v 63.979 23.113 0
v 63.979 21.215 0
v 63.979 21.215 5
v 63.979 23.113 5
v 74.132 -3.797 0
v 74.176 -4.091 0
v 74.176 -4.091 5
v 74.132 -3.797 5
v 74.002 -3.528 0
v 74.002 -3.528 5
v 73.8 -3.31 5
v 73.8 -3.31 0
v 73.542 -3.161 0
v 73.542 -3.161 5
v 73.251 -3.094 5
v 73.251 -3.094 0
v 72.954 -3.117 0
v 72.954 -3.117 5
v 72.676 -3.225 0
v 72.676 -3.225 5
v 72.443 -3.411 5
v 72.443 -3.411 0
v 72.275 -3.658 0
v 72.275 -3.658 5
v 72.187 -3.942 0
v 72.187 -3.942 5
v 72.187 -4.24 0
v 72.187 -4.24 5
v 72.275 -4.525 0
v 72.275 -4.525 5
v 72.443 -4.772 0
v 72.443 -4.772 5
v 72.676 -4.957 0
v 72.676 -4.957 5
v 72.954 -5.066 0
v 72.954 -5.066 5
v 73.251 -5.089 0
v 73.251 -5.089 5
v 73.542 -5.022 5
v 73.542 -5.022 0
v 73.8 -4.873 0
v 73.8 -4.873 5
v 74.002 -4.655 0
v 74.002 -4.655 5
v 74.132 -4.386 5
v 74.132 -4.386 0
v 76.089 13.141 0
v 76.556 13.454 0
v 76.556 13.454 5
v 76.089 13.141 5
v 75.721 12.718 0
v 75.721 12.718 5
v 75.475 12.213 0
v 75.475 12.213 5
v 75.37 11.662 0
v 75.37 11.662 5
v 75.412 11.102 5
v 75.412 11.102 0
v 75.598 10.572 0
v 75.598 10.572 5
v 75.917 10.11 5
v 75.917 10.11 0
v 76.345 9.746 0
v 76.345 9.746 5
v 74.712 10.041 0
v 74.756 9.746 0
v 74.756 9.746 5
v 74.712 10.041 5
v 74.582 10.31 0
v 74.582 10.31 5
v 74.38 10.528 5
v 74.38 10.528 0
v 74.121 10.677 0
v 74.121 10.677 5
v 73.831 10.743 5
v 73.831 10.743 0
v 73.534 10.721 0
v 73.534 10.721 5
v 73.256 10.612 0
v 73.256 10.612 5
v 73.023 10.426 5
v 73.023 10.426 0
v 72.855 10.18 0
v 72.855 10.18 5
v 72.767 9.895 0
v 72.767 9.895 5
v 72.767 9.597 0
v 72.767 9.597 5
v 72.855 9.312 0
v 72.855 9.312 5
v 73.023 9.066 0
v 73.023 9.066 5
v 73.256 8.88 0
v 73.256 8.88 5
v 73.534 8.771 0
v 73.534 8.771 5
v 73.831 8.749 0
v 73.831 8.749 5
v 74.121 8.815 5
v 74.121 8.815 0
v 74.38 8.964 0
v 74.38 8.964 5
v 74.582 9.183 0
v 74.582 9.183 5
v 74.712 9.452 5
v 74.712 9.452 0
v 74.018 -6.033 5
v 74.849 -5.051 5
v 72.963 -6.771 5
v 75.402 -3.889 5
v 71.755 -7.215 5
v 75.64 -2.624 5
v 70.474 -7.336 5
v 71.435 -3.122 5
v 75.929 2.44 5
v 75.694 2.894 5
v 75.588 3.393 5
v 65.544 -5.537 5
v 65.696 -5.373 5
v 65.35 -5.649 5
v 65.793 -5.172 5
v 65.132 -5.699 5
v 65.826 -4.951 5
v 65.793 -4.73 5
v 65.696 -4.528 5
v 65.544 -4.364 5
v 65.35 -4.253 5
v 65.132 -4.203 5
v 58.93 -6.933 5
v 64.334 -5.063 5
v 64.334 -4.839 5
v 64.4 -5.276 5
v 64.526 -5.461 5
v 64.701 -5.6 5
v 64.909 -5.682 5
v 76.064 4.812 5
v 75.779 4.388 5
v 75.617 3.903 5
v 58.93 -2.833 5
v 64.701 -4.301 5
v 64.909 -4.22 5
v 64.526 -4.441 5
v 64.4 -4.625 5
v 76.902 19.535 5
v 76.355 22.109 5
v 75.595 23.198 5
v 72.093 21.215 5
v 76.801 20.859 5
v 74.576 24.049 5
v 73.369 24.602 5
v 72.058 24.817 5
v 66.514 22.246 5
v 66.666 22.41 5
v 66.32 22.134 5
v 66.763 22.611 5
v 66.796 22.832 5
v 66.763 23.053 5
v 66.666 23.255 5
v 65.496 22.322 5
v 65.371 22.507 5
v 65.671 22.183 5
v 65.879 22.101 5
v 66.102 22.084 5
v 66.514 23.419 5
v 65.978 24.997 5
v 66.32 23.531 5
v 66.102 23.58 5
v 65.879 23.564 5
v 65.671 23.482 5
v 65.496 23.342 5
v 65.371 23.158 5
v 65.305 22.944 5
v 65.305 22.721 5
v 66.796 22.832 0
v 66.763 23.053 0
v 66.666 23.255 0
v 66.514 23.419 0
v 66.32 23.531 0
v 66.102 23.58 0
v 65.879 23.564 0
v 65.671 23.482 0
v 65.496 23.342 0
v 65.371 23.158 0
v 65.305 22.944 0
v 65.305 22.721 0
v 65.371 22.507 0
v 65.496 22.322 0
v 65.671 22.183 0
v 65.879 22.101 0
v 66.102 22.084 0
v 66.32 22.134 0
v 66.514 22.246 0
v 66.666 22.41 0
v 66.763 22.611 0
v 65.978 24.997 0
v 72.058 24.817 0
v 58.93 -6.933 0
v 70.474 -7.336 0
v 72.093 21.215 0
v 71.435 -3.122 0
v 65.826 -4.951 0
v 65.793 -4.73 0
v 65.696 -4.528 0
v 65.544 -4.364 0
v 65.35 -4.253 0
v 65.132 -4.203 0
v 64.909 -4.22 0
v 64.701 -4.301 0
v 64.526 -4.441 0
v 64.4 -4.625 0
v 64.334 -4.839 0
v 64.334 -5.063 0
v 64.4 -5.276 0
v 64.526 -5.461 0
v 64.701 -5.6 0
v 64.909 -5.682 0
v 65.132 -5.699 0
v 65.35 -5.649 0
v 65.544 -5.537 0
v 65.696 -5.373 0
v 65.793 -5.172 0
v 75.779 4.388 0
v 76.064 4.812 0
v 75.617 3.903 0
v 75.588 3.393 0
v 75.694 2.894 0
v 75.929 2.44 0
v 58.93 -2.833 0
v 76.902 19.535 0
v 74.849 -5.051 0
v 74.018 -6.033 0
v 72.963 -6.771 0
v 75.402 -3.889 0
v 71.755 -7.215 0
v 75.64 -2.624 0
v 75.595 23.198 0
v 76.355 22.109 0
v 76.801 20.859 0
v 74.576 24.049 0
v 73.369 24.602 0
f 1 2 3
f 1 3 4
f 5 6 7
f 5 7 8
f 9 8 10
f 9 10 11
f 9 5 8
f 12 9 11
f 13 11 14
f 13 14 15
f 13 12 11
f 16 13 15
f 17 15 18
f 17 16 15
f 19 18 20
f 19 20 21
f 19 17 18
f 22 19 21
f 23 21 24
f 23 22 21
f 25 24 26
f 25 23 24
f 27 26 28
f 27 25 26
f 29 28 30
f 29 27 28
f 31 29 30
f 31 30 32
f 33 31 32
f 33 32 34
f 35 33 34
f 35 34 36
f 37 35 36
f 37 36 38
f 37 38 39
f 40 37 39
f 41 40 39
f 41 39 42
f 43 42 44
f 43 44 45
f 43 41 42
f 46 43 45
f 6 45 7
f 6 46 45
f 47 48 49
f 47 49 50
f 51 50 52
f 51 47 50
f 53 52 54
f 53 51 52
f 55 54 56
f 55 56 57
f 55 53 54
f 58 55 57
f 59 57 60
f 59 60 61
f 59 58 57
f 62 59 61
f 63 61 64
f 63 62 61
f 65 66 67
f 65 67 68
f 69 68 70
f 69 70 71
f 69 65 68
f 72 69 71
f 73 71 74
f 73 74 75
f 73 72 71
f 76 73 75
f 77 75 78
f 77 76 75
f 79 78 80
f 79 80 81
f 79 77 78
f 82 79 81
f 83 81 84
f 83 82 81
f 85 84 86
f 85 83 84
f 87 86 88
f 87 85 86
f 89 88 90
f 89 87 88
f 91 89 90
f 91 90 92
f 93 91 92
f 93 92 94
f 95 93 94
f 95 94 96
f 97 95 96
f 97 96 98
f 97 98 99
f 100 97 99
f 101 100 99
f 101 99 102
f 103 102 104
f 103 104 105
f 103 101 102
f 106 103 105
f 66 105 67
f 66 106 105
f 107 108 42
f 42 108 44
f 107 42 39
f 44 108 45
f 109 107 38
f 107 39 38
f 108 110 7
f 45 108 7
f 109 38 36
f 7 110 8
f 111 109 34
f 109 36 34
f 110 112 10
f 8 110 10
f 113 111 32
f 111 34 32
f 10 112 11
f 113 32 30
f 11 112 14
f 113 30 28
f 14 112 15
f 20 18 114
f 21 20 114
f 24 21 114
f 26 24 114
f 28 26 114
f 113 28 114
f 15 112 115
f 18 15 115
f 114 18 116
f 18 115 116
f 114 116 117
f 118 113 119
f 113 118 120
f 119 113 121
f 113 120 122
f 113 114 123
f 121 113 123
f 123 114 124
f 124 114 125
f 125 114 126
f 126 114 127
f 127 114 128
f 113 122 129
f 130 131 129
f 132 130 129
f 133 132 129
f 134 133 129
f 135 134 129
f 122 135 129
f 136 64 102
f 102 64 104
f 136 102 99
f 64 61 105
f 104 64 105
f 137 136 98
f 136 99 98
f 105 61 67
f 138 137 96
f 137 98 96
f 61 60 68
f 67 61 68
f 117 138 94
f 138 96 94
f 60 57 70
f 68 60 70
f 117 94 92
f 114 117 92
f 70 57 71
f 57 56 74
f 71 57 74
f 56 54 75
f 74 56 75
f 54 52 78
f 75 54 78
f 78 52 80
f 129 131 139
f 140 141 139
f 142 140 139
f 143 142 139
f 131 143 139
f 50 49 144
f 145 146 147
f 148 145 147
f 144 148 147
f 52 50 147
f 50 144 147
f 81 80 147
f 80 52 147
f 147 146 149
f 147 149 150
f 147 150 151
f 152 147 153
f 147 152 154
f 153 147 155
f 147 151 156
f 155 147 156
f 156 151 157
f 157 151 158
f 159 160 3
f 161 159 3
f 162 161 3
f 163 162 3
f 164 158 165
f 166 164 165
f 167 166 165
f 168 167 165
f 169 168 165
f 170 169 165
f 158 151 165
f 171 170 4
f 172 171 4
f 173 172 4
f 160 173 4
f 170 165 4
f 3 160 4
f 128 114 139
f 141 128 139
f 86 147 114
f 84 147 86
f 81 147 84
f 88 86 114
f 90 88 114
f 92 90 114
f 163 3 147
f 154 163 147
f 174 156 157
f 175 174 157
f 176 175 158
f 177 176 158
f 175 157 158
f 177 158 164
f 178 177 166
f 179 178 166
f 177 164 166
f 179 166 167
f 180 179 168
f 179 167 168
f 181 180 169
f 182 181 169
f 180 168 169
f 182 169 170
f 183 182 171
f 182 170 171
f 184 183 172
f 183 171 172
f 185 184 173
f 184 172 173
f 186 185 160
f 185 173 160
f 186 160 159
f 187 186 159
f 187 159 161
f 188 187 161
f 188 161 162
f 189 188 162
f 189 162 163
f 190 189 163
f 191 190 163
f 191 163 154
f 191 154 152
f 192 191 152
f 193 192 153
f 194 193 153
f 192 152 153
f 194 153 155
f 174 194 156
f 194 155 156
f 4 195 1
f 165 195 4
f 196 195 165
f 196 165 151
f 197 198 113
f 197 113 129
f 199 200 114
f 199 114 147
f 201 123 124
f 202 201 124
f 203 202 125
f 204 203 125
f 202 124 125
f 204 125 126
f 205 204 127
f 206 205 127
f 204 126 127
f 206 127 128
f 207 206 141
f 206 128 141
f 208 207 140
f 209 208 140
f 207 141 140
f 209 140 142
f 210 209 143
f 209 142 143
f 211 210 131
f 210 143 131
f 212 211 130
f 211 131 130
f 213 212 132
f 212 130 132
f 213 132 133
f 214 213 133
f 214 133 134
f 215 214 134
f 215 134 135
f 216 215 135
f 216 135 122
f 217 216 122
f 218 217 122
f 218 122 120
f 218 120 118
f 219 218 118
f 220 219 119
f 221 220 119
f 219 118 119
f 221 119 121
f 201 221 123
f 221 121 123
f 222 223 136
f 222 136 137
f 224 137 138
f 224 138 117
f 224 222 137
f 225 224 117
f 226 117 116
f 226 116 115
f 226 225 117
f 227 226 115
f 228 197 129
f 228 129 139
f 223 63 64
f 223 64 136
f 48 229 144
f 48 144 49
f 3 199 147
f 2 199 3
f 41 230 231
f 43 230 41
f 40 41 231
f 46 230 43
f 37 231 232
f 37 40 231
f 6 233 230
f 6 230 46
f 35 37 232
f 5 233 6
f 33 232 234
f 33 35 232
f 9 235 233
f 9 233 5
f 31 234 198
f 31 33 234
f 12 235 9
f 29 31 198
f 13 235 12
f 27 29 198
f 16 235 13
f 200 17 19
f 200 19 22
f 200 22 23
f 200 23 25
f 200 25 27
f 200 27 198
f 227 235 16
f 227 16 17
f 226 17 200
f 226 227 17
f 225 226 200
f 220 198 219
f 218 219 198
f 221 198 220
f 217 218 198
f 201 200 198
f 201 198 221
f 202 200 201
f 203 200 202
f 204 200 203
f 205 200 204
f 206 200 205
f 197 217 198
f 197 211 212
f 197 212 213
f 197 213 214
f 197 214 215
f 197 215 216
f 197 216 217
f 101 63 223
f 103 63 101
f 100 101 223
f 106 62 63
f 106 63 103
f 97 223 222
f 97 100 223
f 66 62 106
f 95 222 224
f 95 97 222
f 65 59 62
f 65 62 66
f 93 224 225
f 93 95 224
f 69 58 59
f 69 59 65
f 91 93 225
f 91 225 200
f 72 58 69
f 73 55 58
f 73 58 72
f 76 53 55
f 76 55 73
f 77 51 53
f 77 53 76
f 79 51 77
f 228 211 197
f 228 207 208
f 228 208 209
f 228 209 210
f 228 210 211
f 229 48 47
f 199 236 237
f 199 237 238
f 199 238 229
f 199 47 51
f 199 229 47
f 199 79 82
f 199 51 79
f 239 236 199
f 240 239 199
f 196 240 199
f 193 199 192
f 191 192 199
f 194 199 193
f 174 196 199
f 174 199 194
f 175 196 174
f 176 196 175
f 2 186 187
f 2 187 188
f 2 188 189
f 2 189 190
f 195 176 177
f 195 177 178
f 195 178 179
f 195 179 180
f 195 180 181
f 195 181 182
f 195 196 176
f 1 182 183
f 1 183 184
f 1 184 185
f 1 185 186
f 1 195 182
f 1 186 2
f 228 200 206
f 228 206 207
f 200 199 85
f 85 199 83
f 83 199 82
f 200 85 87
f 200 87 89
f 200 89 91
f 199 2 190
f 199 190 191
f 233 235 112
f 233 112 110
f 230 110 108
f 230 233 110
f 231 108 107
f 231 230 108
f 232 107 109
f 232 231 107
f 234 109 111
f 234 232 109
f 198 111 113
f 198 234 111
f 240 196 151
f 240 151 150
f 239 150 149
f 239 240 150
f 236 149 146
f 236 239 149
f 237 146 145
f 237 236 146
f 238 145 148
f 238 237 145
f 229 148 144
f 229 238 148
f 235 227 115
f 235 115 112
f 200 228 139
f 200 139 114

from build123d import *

# Parameters (mm, degrees)
SKETCH1_R           = 1
BOSS_EXTRUDE1_DEPTH = 5
SKETCH2_R           = 0.75
CUT_EXTRUDE1_DEPTH  = 5
CHAMFER1_SIZE2      = 2
CHAMFER1_SIZE       = 1.943358552


with BuildPart() as part:
    # Sketch1 → Boss-Extrude1 (new body)
    with BuildSketch(Plane.XY):
        with BuildLine():
            Line((63.978592029, 21.214561498), (63.978592029, 25.05586024))
            Line((63.978592029, 25.05586024), (72.058256518, 24.816727889))
            ThreePointArc((72.058256518, 24.816727889), (75.595399687, 23.198311963), (76.902246949, 19.534597706))
            Line((76.902246949, 19.534597706), (76.555916572, 13.453920838))
            ThreePointArc((76.555916572, 13.453920838), (75.36962468, 11.661641728), (76.3447433, 9.746257553))
            Line((76.3447433, 9.746257553), (76.063685342, 4.811597648))
            ThreePointArc((76.063685342, 4.811597648), (75.584983034, 3.649375801), (75.928626908, 2.440316493))
            Line((75.928626908, 2.440316493), (75.640205821, -2.623621136))
            ThreePointArc((75.640205821, -2.623621136), (74.017880394, -6.033338403), (70.473798594, -7.336256597))
            Line((70.473798594, -7.336256597), (58.930433709, -6.933153413))
            Line((58.930433709, -6.933153413), (58.930433709, -2.832883595))
            Line((58.930433709, -2.832883595), (71.435141734, -3.122466307))
            Line((71.435141734, -3.122466307), (72.093475791, 21.214561498))
            Line((72.093475791, 21.214561498), (63.978592029, 21.214561498))
        make_face()
        with Locations((73.176178498, -4.091448782)):
            Circle(SKETCH1_R, mode=Mode.SUBTRACT)
        with Locations((73.756130882, 9.746257553)):
            Circle(SKETCH1_R, mode=Mode.SUBTRACT)
    extrude(amount=BOSS_EXTRUDE1_DEPTH)

    # Sketch2 → Cut-Extrude1 (cut)
    with BuildSketch(Plane.XY.offset(5)):
        with Locations((65.076045823, -4.950719542)):
            Circle(SKETCH2_R)
        with Locations((66.046251832, 22.832345449)):
            Circle(SKETCH2_R)
    extrude(amount=-CUT_EXTRUDE1_DEPTH, mode=Mode.SUBTRACT)

    # Chamfer1
    chamfer1_edges = [part.edges().sort_by_distance(p)[0] for p in [
        (63.978592029, 25.05586024, 2.5),
    ]]
    chamfer(chamfer1_edges, length=CHAMFER1_SIZE, length2=CHAMFER1_SIZE2)


solid = part.part
